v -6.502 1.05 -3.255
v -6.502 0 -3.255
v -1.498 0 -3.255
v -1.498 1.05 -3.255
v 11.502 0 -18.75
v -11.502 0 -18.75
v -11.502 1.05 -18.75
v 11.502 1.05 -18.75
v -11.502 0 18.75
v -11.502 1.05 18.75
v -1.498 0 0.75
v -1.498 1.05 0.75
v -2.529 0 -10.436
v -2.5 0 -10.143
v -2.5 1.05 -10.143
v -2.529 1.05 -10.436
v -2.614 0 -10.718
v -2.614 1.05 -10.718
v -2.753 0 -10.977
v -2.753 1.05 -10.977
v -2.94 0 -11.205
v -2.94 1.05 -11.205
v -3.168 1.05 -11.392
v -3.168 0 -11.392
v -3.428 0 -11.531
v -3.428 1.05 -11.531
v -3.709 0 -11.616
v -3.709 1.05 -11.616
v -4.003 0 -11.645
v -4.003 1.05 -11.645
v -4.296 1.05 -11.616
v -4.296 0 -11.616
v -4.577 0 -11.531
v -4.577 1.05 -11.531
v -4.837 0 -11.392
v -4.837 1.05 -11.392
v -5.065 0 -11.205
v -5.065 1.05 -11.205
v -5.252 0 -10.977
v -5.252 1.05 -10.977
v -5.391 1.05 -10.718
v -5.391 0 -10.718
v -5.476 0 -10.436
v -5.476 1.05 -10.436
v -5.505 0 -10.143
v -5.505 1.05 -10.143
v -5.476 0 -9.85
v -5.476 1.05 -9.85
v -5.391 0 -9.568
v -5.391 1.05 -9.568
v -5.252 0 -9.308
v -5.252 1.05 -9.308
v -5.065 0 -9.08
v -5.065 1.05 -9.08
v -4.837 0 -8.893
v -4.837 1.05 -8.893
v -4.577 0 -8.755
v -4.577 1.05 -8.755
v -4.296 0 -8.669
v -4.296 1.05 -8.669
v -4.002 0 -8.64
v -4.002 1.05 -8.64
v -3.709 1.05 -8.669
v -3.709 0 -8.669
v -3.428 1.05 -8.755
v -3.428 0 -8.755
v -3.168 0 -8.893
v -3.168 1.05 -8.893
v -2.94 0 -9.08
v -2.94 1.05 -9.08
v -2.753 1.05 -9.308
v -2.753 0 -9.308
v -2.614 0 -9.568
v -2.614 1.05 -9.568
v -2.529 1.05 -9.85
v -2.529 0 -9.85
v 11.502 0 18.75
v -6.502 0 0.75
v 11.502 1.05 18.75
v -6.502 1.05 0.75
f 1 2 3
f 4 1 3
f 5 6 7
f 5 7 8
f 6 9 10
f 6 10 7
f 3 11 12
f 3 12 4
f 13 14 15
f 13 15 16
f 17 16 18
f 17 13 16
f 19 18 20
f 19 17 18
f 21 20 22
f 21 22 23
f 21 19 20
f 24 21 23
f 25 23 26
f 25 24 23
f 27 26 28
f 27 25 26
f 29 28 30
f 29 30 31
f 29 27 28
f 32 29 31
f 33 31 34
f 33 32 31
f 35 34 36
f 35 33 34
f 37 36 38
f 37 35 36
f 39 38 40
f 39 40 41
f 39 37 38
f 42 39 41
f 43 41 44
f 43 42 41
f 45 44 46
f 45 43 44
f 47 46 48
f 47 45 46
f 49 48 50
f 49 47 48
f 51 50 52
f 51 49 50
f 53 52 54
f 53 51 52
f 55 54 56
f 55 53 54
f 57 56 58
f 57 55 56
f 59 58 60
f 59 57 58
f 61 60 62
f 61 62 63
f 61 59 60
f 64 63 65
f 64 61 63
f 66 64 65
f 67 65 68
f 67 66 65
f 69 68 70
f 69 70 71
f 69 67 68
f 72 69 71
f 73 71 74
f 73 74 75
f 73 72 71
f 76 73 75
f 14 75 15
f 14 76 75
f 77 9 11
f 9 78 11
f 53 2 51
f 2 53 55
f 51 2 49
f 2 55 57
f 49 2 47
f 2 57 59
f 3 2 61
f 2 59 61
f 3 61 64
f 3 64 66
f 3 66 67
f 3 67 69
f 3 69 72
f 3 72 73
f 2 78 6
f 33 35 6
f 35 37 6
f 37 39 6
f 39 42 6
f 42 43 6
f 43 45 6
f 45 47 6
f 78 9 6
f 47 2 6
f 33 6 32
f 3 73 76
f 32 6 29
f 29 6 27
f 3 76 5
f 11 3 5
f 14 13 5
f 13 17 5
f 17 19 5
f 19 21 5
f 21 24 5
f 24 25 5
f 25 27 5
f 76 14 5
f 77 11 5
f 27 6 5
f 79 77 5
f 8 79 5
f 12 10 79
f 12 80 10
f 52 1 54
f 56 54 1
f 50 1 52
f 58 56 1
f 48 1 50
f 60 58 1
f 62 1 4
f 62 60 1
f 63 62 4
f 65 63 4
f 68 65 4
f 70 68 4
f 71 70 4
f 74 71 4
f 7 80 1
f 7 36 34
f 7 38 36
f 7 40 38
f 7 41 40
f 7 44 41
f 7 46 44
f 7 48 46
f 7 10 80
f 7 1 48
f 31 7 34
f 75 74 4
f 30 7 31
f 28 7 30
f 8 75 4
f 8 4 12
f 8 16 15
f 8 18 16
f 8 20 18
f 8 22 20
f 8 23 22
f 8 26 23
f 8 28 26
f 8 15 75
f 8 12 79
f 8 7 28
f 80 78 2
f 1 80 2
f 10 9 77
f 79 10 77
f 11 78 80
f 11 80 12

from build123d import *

# Parameters (mm, degrees)
SKETCH1_W           = 23.005
SKETCH1_H           = 37.5
SKETCH1_R           = 1.5025
SKETCH1_W_2         = 5.005
SKETCH1_H_2         = 4.005
BOSS_EXTRUDE1_DEPTH = 1.05


with BuildPart() as part:
    # Sketch1 → Boss-Extrude1 (new body)
    with BuildSketch(Plane(origin=(0, 0, 0), x_dir=(1, 0, 0), z_dir=(0, 1, 0))):
        Rectangle(SKETCH1_W, SKETCH1_H)
        with Locations((-4.0025, 10.14275)):
            Circle(SKETCH1_R, mode=Mode.SUBTRACT)
        with Locations((-4, 1.2525)):
            Rectangle(SKETCH1_W_2, SKETCH1_H_2, mode=Mode.SUBTRACT)
    extrude(amount=BOSS_EXTRUDE1_DEPTH)


solid = part.part
